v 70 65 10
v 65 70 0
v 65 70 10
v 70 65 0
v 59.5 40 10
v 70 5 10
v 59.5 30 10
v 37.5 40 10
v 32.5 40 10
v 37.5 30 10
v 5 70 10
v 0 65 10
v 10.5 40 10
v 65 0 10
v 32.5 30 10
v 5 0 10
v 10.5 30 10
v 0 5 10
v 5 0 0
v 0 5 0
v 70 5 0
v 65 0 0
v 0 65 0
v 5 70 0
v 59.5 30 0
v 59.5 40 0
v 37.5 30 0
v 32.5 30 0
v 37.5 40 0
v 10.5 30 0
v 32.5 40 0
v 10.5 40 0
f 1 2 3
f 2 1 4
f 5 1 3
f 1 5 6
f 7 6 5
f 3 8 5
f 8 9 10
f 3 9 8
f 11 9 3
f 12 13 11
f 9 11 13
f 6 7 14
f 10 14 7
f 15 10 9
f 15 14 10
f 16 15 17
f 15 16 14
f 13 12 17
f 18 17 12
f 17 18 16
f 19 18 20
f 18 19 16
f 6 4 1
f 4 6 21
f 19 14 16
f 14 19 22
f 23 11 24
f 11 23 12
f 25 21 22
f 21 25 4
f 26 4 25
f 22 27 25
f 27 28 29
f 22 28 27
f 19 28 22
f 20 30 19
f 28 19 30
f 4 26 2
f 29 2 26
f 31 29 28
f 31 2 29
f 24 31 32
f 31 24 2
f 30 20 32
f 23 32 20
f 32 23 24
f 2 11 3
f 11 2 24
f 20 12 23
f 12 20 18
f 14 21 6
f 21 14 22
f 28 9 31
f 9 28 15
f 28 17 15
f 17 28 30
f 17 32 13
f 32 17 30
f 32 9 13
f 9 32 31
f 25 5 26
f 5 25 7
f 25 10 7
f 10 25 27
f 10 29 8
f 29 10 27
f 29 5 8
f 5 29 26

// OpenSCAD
$fn = 32;

// ----------------------------------------------------------------------
// Windowed plate: 2 voids, 70 x 70 x 10 mm
// ----------------------------------------------------------------------

// --- parameters (mm) ---
plate_l = 70;             // plate length, X
plate_w = 70;             // plate width, Y
plate_t = 10;             // plate thickness, Z
edge_margin = 8;          // wall from the plate edge to any window
windows = 2;              // number of windows in the row
win_l = 22;               // window length
win_w = 10;               // window width
win_pitch = 27;           // window pitch along X
depth_1 = 10;             // depth of void 1 (full thickness = through)
depth_2 = 10;             // depth of void 2 (full thickness = through)
corner_c = 5;             // corner chamfer of the plate

profile = [[5, 0], [65, 0], [70, 5], [70, 65], [65, 70], [5, 70], [0, 65], [0, 5]];  // primary outline, 8 points, counter clockwise
void_1 = [[10.5, 30], [32.5, 30], [32.5, 40], [10.5, 40]];  // window 1 of the row, 4 points
void_2 = [[37.5, 30], [59.5, 30], [59.5, 40], [37.5, 40]];  // window 2 of the row, 4 points

// --- the one profile operation ---
difference() {
  linear_extrude(height = plate_t) polygon(points = profile);
  translate([0, 0, -1])
    linear_extrude(height = plate_t + 2) polygon(points = void_1);
  translate([0, 0, -1])
    linear_extrude(height = plate_t + 2) polygon(points = void_2);
}
